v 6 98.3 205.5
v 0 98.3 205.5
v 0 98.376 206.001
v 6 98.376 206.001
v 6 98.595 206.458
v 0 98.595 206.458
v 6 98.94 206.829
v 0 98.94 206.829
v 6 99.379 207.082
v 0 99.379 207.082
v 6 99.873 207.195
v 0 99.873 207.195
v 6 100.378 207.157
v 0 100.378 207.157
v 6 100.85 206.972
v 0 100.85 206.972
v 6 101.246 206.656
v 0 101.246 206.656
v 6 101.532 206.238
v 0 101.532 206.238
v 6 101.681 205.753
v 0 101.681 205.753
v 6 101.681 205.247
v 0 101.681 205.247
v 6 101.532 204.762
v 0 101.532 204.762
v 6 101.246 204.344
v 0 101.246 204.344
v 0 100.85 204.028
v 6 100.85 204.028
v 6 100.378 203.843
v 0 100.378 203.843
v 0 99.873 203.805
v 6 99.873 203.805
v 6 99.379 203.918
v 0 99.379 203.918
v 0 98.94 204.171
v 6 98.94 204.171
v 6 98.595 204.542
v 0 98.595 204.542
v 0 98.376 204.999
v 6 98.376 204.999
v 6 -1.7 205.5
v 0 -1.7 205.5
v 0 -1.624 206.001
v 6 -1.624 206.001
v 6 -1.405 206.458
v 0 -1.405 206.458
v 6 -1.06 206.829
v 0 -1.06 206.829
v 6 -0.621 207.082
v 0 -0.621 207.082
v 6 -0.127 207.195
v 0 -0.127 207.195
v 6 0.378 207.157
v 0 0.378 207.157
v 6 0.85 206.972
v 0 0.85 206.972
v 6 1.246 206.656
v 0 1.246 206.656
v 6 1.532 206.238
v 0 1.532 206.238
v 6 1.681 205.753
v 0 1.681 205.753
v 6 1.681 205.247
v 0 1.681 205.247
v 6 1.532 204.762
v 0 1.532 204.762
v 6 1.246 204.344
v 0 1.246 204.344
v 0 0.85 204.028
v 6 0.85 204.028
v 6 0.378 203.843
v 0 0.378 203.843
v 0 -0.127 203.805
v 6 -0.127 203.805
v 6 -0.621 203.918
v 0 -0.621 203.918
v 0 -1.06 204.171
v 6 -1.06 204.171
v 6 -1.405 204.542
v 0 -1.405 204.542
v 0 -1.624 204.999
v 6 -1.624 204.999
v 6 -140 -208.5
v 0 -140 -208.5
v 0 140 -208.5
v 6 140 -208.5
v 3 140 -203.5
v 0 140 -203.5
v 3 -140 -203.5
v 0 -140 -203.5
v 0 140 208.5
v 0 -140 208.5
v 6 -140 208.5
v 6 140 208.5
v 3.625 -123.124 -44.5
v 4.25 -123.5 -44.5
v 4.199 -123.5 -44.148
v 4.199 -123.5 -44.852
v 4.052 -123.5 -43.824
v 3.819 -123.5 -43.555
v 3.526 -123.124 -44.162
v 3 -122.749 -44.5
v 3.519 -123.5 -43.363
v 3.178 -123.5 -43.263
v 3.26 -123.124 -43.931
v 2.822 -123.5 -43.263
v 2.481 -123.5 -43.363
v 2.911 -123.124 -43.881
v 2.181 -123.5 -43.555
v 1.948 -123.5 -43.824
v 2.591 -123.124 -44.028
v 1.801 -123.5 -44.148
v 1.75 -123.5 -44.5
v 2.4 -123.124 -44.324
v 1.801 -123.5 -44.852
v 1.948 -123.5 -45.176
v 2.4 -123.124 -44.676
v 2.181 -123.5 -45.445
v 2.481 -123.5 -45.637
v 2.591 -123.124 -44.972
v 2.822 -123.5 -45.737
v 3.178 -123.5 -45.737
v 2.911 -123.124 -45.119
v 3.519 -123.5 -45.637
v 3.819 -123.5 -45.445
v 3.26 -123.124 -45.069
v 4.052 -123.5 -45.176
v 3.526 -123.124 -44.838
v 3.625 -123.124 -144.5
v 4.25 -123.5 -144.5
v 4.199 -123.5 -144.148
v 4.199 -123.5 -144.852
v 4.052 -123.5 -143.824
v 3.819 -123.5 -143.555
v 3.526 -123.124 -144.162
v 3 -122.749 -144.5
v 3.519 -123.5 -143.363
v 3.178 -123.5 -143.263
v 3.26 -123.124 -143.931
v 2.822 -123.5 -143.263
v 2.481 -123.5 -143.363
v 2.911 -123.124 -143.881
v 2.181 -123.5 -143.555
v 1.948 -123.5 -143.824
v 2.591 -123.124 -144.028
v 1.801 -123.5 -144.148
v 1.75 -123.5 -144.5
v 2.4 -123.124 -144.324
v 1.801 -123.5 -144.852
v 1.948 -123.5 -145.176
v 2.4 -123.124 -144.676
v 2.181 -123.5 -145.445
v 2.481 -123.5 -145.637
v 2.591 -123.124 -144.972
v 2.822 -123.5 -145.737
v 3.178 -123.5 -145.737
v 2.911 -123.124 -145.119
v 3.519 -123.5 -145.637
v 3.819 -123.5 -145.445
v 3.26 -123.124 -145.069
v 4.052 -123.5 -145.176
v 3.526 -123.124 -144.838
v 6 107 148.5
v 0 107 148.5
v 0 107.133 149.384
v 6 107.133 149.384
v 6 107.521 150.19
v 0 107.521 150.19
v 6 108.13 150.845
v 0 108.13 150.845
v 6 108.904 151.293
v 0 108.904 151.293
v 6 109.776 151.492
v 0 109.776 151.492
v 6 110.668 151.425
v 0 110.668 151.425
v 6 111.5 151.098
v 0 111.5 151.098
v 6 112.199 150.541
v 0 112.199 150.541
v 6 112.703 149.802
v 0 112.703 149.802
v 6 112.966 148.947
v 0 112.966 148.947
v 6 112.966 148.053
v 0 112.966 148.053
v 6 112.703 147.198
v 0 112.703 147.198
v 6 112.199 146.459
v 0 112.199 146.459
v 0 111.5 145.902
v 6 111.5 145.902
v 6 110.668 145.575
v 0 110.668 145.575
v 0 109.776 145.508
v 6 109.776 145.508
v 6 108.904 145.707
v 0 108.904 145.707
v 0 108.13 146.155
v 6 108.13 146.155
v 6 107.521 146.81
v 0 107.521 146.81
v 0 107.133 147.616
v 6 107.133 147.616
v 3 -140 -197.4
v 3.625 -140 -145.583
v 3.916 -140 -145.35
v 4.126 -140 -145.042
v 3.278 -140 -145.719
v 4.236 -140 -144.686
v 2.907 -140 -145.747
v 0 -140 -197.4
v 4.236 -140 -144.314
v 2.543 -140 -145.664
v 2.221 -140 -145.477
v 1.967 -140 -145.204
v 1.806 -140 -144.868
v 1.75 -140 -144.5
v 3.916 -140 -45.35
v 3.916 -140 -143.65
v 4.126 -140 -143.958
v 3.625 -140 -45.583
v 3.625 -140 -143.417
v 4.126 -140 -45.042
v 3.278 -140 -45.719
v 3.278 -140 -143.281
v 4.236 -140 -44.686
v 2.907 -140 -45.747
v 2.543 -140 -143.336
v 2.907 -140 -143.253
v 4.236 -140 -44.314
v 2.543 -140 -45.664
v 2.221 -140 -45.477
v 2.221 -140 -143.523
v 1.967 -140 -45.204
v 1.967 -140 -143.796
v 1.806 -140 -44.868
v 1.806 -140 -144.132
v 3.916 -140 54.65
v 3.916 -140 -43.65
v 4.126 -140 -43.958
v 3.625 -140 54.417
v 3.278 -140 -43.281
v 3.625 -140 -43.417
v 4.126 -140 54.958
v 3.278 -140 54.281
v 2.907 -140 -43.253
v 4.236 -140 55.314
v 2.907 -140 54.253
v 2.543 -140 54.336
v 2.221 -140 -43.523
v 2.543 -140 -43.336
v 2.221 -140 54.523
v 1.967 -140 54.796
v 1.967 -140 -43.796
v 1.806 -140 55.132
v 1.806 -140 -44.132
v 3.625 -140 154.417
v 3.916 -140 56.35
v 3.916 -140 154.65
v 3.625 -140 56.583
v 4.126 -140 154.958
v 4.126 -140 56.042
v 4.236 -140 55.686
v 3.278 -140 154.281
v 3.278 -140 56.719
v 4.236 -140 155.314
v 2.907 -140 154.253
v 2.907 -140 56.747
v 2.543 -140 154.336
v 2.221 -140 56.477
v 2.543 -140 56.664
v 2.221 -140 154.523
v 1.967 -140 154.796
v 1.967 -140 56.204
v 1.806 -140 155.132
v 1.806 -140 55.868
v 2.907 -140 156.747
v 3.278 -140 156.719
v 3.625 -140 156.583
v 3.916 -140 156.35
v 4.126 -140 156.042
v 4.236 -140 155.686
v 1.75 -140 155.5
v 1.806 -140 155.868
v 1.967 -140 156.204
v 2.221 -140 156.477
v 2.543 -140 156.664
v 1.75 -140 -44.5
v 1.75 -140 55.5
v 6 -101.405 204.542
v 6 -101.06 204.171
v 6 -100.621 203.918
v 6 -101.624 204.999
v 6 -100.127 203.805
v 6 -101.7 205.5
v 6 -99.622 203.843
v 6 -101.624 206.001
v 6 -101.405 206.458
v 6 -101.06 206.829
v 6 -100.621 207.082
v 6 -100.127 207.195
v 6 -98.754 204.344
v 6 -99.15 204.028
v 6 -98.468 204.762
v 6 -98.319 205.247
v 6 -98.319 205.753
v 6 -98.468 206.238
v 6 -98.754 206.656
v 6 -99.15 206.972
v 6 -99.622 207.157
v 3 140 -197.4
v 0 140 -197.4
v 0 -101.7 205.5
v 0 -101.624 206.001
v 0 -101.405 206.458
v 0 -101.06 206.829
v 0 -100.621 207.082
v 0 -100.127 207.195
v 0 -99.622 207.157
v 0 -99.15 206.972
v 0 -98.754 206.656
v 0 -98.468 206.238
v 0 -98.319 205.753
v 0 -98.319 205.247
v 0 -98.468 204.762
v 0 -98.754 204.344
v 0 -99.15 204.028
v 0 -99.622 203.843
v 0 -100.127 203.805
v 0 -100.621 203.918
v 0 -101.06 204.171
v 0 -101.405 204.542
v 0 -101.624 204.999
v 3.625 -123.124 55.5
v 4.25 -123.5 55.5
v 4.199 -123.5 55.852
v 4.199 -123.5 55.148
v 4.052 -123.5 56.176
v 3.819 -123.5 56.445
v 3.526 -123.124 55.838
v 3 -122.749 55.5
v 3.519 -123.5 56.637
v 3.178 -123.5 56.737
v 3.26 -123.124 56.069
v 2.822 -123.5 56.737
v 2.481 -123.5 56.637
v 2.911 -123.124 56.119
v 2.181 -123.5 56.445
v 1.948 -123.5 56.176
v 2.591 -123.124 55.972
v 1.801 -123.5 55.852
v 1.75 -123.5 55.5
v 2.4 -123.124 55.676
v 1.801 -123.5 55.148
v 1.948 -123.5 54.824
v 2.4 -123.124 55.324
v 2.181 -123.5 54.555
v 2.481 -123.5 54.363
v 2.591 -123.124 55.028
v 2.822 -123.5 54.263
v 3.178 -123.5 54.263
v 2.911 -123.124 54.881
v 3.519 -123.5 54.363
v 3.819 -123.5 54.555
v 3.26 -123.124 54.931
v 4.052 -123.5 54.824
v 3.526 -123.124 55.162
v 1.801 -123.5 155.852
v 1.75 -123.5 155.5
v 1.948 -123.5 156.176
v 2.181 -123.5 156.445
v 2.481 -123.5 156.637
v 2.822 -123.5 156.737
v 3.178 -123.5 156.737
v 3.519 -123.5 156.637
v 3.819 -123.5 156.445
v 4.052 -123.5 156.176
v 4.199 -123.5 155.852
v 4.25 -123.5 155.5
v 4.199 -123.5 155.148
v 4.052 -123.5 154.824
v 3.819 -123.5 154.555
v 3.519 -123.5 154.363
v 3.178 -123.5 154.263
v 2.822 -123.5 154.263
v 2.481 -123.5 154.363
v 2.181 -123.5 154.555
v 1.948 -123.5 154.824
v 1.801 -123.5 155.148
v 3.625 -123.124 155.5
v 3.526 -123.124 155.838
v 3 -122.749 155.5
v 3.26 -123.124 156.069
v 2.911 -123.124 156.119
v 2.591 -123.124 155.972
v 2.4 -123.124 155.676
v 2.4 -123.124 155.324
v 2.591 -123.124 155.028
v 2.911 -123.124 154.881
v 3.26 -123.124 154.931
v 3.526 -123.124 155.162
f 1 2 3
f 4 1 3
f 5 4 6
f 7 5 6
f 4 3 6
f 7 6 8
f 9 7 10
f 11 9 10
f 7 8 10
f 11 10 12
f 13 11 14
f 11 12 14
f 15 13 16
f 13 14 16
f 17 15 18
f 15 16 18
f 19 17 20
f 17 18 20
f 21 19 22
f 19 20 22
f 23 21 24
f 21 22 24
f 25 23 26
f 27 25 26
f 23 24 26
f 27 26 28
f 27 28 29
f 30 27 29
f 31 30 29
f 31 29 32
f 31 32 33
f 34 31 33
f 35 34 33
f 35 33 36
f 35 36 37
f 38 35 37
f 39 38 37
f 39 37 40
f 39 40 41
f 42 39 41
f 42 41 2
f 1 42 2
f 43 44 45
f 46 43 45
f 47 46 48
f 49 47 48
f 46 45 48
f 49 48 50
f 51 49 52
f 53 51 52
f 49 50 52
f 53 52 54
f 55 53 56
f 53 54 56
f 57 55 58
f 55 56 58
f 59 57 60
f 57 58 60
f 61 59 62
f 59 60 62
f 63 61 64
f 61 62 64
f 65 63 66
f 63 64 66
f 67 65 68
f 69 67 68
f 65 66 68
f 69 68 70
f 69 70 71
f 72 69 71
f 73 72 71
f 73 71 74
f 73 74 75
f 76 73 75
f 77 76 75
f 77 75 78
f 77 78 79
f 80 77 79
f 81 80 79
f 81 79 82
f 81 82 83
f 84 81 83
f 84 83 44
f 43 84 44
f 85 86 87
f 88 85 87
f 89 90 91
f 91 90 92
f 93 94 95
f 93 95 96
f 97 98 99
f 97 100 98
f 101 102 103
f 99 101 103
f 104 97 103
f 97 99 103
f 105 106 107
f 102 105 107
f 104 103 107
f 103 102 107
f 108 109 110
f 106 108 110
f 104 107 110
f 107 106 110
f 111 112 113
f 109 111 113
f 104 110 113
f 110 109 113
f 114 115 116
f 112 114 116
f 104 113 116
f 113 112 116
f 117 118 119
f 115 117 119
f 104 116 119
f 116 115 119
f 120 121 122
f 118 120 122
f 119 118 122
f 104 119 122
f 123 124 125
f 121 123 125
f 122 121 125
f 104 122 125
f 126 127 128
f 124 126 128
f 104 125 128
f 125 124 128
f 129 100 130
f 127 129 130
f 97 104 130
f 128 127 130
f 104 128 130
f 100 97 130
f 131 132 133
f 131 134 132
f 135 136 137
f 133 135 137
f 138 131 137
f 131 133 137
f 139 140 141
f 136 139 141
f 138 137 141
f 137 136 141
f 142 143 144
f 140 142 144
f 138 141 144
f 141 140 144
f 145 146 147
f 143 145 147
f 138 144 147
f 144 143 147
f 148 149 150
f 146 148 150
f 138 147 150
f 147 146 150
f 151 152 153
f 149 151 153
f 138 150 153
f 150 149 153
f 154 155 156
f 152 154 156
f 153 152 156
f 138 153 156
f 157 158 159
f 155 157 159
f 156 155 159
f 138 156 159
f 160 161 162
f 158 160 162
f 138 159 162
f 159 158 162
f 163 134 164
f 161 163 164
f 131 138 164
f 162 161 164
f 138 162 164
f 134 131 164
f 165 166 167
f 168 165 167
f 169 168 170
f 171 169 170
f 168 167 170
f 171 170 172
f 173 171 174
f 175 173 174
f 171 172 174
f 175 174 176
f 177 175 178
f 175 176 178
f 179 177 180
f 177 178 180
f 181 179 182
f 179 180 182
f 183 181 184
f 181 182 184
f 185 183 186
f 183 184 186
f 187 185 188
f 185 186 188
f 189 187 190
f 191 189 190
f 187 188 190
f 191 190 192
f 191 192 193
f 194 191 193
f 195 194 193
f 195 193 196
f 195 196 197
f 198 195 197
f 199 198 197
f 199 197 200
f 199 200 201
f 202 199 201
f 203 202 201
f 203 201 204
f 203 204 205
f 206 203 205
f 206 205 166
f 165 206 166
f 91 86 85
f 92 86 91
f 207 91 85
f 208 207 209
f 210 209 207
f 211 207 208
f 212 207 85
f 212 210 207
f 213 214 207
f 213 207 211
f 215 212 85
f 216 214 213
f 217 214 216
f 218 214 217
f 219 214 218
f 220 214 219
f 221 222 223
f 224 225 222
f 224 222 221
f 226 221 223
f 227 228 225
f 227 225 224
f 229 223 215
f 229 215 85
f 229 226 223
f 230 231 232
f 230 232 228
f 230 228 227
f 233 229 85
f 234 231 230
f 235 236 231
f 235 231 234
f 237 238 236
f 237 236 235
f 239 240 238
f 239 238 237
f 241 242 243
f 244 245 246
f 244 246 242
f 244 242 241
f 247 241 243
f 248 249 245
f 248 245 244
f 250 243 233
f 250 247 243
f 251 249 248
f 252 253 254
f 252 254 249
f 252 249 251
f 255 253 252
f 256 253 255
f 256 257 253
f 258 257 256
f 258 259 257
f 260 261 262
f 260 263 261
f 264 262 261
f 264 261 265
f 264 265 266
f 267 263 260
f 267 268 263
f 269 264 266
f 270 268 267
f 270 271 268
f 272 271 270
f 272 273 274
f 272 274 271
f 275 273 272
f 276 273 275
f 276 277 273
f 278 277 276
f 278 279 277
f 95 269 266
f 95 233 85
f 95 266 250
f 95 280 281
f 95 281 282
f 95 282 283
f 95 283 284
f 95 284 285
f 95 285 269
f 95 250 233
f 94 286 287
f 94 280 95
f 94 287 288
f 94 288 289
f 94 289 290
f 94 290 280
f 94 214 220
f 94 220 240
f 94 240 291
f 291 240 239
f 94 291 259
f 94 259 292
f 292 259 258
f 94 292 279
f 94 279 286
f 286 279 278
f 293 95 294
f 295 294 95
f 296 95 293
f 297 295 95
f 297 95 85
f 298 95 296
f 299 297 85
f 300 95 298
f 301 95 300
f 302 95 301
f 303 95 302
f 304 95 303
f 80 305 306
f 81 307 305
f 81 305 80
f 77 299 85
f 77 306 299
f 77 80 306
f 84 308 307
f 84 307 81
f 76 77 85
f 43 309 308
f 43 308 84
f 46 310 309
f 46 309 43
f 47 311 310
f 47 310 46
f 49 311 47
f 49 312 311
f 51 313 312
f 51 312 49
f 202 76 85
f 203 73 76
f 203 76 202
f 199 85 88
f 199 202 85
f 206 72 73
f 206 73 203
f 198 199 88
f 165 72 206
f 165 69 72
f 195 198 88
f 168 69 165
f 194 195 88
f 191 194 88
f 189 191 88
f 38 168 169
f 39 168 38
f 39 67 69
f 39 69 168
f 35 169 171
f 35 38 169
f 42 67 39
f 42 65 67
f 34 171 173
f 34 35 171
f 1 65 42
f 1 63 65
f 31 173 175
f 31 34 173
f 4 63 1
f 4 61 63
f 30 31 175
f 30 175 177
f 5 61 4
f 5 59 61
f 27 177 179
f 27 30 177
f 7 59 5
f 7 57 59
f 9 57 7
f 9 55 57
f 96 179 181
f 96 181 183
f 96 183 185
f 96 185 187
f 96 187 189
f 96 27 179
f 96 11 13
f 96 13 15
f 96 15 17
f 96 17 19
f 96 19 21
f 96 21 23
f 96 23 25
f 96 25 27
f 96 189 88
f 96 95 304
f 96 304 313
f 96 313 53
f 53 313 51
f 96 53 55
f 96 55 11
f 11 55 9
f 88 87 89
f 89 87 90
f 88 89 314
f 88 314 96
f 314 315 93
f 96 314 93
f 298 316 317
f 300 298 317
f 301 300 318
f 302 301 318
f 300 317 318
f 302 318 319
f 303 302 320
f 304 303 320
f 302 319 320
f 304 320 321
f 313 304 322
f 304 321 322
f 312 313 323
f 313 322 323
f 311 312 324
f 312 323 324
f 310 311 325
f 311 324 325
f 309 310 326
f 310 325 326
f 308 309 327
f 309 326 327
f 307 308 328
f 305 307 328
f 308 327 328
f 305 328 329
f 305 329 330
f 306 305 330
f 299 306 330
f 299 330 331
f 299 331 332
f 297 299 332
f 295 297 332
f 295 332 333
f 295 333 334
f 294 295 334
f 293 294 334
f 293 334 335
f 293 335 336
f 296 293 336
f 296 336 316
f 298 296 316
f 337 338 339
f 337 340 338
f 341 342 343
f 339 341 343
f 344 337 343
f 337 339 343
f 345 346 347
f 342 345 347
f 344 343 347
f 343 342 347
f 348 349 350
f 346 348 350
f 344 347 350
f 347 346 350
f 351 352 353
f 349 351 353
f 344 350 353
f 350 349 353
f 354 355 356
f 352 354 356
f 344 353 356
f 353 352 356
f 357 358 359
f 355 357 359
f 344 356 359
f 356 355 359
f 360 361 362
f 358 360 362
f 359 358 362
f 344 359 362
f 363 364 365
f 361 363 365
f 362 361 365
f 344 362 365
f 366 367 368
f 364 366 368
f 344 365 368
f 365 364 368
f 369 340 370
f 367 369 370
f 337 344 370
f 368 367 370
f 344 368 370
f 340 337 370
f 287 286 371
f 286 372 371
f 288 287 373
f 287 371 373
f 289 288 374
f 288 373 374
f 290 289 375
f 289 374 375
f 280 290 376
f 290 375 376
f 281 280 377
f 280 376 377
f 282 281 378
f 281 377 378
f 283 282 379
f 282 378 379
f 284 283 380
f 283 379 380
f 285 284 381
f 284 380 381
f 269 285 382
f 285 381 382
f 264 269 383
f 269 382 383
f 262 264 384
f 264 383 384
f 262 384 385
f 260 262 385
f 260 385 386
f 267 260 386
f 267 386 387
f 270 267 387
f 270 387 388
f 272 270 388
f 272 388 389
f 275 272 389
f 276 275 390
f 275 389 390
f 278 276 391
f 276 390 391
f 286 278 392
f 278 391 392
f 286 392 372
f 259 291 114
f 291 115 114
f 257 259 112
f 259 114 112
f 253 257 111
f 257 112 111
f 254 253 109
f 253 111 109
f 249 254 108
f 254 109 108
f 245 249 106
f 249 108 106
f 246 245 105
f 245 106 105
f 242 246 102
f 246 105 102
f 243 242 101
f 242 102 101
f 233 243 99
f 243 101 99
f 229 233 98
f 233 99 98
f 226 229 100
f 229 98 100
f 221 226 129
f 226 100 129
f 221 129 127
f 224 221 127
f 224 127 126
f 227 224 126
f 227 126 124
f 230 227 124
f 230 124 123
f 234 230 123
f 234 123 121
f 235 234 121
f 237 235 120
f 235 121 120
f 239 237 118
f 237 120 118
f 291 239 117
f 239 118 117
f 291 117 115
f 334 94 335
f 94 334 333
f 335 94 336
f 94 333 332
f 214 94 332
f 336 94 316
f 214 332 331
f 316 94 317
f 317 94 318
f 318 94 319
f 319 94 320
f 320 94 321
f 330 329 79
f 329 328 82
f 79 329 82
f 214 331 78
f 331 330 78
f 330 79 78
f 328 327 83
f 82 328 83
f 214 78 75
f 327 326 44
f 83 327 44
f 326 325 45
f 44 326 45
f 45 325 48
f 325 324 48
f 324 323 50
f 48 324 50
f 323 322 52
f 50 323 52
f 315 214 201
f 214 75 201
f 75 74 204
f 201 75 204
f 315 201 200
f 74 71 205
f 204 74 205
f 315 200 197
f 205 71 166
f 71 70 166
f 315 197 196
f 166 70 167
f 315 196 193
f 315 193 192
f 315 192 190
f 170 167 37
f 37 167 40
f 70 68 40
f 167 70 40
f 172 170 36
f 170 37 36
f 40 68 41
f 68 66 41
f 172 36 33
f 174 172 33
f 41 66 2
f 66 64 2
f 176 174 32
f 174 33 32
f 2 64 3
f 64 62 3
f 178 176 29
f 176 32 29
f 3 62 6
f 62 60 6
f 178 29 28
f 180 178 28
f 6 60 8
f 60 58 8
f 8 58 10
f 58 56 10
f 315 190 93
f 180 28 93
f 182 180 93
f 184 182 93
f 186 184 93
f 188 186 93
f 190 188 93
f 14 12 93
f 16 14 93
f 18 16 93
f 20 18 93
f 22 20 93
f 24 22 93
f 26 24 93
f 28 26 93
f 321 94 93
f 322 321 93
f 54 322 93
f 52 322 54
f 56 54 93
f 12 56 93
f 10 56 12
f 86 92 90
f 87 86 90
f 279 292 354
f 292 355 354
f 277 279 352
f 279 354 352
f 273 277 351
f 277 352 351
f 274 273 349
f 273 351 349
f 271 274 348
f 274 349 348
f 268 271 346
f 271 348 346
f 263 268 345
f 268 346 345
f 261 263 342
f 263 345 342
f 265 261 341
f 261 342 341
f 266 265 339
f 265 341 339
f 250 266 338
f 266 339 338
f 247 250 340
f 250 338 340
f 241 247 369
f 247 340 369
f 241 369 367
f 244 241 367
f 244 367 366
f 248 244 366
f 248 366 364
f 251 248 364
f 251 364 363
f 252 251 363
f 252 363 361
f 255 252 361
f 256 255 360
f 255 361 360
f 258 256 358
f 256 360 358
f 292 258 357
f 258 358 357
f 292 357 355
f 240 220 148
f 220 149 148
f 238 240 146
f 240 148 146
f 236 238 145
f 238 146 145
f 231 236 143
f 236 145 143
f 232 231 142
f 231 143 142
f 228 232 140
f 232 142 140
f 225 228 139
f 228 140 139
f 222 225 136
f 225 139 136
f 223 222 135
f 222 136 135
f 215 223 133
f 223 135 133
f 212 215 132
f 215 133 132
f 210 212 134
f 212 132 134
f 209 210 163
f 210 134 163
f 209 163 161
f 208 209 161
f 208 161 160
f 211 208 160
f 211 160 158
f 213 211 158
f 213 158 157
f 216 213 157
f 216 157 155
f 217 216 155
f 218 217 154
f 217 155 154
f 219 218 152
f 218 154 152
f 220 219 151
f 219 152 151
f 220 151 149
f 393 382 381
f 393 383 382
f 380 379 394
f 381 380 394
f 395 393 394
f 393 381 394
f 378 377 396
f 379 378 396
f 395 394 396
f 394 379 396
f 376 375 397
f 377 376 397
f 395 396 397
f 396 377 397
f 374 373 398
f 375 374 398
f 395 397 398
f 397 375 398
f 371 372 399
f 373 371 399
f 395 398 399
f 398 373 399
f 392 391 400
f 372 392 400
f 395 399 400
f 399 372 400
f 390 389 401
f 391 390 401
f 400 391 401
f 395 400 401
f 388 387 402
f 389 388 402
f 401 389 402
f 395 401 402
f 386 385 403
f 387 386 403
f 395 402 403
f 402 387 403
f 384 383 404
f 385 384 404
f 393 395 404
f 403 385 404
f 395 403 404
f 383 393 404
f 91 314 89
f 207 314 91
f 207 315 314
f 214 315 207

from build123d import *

# Parameters (mm, degrees)
F0_W      = 280
F0_H      = 417
F1_DEPTH  = 6
F3_D      = 3.4
F4_W      = 280
F4_H      = 6.1
F5_DEPTH  = 3
F8_D      = 2.5
F8_DEPTH  = 16.5
F8_TIP    = 0.7510757738
F9_D      = 6
F10_D     = 2.5
F10_DEPTH = 16.5
F10_TIP   = 0.7510757738


# Not quite as in the source:
# - a feature names something its author has since deleted; it is built from what else it names


with BuildPart() as f1:
    # F0 (on Right) → F1 (new body)
    with BuildSketch(Plane.YZ):
        Rectangle(F0_W, F0_H)
    extrude(amount=F1_DEPTH)

    # F3 (through all)
    with Locations(Plane.YZ.offset(6)):
        with Locations((100, 205.5), (0, 205.5), (-100, 205.5)):
            Hole(F3_D / 2)


with BuildPart() as f5:
    # F4 (on face) → F5 (new body)
    with BuildSketch(Plane(origin=(0, 0, 0), x_dir=(0, -1, 0), z_dir=(-1, 0, 0))):
        with Locations((0, -200.45)):
            Rectangle(F4_W, F4_H)
    extrude(amount=-F5_DEPTH)


with BuildPart() as f1_1:
    add(f1.part)

    # F6: cut F5
    add(f5.part, mode=Mode.SUBTRACT)

    # F8
    with Locations(Plane.XZ.offset(140)):
        with Locations((3, 155.5), (3, 55.5), (3, -44.5)):
            Hole(F8_D / 2, depth=F8_DEPTH)
            with Locations((0, 0, -(F8_DEPTH + F8_TIP / 2))):  # 118° drill point
                Cone(0, F8_D / 2, F8_TIP, mode=Mode.SUBTRACT)

    # F9 (through all)
    with Locations(Plane.YZ.offset(6)):
        with Locations((110, 148.5)):
            Hole(F9_D / 2)

    # F10
    with Locations(Plane.XZ.offset(140)):
        with Locations((3, -144.5)):
            Hole(F10_D / 2, depth=F10_DEPTH)
            with Locations((0, 0, -(F10_DEPTH + F10_TIP / 2))):  # 118° drill point
                Cone(0, F10_D / 2, F10_TIP, mode=Mode.SUBTRACT)


solid = f1_1.part
